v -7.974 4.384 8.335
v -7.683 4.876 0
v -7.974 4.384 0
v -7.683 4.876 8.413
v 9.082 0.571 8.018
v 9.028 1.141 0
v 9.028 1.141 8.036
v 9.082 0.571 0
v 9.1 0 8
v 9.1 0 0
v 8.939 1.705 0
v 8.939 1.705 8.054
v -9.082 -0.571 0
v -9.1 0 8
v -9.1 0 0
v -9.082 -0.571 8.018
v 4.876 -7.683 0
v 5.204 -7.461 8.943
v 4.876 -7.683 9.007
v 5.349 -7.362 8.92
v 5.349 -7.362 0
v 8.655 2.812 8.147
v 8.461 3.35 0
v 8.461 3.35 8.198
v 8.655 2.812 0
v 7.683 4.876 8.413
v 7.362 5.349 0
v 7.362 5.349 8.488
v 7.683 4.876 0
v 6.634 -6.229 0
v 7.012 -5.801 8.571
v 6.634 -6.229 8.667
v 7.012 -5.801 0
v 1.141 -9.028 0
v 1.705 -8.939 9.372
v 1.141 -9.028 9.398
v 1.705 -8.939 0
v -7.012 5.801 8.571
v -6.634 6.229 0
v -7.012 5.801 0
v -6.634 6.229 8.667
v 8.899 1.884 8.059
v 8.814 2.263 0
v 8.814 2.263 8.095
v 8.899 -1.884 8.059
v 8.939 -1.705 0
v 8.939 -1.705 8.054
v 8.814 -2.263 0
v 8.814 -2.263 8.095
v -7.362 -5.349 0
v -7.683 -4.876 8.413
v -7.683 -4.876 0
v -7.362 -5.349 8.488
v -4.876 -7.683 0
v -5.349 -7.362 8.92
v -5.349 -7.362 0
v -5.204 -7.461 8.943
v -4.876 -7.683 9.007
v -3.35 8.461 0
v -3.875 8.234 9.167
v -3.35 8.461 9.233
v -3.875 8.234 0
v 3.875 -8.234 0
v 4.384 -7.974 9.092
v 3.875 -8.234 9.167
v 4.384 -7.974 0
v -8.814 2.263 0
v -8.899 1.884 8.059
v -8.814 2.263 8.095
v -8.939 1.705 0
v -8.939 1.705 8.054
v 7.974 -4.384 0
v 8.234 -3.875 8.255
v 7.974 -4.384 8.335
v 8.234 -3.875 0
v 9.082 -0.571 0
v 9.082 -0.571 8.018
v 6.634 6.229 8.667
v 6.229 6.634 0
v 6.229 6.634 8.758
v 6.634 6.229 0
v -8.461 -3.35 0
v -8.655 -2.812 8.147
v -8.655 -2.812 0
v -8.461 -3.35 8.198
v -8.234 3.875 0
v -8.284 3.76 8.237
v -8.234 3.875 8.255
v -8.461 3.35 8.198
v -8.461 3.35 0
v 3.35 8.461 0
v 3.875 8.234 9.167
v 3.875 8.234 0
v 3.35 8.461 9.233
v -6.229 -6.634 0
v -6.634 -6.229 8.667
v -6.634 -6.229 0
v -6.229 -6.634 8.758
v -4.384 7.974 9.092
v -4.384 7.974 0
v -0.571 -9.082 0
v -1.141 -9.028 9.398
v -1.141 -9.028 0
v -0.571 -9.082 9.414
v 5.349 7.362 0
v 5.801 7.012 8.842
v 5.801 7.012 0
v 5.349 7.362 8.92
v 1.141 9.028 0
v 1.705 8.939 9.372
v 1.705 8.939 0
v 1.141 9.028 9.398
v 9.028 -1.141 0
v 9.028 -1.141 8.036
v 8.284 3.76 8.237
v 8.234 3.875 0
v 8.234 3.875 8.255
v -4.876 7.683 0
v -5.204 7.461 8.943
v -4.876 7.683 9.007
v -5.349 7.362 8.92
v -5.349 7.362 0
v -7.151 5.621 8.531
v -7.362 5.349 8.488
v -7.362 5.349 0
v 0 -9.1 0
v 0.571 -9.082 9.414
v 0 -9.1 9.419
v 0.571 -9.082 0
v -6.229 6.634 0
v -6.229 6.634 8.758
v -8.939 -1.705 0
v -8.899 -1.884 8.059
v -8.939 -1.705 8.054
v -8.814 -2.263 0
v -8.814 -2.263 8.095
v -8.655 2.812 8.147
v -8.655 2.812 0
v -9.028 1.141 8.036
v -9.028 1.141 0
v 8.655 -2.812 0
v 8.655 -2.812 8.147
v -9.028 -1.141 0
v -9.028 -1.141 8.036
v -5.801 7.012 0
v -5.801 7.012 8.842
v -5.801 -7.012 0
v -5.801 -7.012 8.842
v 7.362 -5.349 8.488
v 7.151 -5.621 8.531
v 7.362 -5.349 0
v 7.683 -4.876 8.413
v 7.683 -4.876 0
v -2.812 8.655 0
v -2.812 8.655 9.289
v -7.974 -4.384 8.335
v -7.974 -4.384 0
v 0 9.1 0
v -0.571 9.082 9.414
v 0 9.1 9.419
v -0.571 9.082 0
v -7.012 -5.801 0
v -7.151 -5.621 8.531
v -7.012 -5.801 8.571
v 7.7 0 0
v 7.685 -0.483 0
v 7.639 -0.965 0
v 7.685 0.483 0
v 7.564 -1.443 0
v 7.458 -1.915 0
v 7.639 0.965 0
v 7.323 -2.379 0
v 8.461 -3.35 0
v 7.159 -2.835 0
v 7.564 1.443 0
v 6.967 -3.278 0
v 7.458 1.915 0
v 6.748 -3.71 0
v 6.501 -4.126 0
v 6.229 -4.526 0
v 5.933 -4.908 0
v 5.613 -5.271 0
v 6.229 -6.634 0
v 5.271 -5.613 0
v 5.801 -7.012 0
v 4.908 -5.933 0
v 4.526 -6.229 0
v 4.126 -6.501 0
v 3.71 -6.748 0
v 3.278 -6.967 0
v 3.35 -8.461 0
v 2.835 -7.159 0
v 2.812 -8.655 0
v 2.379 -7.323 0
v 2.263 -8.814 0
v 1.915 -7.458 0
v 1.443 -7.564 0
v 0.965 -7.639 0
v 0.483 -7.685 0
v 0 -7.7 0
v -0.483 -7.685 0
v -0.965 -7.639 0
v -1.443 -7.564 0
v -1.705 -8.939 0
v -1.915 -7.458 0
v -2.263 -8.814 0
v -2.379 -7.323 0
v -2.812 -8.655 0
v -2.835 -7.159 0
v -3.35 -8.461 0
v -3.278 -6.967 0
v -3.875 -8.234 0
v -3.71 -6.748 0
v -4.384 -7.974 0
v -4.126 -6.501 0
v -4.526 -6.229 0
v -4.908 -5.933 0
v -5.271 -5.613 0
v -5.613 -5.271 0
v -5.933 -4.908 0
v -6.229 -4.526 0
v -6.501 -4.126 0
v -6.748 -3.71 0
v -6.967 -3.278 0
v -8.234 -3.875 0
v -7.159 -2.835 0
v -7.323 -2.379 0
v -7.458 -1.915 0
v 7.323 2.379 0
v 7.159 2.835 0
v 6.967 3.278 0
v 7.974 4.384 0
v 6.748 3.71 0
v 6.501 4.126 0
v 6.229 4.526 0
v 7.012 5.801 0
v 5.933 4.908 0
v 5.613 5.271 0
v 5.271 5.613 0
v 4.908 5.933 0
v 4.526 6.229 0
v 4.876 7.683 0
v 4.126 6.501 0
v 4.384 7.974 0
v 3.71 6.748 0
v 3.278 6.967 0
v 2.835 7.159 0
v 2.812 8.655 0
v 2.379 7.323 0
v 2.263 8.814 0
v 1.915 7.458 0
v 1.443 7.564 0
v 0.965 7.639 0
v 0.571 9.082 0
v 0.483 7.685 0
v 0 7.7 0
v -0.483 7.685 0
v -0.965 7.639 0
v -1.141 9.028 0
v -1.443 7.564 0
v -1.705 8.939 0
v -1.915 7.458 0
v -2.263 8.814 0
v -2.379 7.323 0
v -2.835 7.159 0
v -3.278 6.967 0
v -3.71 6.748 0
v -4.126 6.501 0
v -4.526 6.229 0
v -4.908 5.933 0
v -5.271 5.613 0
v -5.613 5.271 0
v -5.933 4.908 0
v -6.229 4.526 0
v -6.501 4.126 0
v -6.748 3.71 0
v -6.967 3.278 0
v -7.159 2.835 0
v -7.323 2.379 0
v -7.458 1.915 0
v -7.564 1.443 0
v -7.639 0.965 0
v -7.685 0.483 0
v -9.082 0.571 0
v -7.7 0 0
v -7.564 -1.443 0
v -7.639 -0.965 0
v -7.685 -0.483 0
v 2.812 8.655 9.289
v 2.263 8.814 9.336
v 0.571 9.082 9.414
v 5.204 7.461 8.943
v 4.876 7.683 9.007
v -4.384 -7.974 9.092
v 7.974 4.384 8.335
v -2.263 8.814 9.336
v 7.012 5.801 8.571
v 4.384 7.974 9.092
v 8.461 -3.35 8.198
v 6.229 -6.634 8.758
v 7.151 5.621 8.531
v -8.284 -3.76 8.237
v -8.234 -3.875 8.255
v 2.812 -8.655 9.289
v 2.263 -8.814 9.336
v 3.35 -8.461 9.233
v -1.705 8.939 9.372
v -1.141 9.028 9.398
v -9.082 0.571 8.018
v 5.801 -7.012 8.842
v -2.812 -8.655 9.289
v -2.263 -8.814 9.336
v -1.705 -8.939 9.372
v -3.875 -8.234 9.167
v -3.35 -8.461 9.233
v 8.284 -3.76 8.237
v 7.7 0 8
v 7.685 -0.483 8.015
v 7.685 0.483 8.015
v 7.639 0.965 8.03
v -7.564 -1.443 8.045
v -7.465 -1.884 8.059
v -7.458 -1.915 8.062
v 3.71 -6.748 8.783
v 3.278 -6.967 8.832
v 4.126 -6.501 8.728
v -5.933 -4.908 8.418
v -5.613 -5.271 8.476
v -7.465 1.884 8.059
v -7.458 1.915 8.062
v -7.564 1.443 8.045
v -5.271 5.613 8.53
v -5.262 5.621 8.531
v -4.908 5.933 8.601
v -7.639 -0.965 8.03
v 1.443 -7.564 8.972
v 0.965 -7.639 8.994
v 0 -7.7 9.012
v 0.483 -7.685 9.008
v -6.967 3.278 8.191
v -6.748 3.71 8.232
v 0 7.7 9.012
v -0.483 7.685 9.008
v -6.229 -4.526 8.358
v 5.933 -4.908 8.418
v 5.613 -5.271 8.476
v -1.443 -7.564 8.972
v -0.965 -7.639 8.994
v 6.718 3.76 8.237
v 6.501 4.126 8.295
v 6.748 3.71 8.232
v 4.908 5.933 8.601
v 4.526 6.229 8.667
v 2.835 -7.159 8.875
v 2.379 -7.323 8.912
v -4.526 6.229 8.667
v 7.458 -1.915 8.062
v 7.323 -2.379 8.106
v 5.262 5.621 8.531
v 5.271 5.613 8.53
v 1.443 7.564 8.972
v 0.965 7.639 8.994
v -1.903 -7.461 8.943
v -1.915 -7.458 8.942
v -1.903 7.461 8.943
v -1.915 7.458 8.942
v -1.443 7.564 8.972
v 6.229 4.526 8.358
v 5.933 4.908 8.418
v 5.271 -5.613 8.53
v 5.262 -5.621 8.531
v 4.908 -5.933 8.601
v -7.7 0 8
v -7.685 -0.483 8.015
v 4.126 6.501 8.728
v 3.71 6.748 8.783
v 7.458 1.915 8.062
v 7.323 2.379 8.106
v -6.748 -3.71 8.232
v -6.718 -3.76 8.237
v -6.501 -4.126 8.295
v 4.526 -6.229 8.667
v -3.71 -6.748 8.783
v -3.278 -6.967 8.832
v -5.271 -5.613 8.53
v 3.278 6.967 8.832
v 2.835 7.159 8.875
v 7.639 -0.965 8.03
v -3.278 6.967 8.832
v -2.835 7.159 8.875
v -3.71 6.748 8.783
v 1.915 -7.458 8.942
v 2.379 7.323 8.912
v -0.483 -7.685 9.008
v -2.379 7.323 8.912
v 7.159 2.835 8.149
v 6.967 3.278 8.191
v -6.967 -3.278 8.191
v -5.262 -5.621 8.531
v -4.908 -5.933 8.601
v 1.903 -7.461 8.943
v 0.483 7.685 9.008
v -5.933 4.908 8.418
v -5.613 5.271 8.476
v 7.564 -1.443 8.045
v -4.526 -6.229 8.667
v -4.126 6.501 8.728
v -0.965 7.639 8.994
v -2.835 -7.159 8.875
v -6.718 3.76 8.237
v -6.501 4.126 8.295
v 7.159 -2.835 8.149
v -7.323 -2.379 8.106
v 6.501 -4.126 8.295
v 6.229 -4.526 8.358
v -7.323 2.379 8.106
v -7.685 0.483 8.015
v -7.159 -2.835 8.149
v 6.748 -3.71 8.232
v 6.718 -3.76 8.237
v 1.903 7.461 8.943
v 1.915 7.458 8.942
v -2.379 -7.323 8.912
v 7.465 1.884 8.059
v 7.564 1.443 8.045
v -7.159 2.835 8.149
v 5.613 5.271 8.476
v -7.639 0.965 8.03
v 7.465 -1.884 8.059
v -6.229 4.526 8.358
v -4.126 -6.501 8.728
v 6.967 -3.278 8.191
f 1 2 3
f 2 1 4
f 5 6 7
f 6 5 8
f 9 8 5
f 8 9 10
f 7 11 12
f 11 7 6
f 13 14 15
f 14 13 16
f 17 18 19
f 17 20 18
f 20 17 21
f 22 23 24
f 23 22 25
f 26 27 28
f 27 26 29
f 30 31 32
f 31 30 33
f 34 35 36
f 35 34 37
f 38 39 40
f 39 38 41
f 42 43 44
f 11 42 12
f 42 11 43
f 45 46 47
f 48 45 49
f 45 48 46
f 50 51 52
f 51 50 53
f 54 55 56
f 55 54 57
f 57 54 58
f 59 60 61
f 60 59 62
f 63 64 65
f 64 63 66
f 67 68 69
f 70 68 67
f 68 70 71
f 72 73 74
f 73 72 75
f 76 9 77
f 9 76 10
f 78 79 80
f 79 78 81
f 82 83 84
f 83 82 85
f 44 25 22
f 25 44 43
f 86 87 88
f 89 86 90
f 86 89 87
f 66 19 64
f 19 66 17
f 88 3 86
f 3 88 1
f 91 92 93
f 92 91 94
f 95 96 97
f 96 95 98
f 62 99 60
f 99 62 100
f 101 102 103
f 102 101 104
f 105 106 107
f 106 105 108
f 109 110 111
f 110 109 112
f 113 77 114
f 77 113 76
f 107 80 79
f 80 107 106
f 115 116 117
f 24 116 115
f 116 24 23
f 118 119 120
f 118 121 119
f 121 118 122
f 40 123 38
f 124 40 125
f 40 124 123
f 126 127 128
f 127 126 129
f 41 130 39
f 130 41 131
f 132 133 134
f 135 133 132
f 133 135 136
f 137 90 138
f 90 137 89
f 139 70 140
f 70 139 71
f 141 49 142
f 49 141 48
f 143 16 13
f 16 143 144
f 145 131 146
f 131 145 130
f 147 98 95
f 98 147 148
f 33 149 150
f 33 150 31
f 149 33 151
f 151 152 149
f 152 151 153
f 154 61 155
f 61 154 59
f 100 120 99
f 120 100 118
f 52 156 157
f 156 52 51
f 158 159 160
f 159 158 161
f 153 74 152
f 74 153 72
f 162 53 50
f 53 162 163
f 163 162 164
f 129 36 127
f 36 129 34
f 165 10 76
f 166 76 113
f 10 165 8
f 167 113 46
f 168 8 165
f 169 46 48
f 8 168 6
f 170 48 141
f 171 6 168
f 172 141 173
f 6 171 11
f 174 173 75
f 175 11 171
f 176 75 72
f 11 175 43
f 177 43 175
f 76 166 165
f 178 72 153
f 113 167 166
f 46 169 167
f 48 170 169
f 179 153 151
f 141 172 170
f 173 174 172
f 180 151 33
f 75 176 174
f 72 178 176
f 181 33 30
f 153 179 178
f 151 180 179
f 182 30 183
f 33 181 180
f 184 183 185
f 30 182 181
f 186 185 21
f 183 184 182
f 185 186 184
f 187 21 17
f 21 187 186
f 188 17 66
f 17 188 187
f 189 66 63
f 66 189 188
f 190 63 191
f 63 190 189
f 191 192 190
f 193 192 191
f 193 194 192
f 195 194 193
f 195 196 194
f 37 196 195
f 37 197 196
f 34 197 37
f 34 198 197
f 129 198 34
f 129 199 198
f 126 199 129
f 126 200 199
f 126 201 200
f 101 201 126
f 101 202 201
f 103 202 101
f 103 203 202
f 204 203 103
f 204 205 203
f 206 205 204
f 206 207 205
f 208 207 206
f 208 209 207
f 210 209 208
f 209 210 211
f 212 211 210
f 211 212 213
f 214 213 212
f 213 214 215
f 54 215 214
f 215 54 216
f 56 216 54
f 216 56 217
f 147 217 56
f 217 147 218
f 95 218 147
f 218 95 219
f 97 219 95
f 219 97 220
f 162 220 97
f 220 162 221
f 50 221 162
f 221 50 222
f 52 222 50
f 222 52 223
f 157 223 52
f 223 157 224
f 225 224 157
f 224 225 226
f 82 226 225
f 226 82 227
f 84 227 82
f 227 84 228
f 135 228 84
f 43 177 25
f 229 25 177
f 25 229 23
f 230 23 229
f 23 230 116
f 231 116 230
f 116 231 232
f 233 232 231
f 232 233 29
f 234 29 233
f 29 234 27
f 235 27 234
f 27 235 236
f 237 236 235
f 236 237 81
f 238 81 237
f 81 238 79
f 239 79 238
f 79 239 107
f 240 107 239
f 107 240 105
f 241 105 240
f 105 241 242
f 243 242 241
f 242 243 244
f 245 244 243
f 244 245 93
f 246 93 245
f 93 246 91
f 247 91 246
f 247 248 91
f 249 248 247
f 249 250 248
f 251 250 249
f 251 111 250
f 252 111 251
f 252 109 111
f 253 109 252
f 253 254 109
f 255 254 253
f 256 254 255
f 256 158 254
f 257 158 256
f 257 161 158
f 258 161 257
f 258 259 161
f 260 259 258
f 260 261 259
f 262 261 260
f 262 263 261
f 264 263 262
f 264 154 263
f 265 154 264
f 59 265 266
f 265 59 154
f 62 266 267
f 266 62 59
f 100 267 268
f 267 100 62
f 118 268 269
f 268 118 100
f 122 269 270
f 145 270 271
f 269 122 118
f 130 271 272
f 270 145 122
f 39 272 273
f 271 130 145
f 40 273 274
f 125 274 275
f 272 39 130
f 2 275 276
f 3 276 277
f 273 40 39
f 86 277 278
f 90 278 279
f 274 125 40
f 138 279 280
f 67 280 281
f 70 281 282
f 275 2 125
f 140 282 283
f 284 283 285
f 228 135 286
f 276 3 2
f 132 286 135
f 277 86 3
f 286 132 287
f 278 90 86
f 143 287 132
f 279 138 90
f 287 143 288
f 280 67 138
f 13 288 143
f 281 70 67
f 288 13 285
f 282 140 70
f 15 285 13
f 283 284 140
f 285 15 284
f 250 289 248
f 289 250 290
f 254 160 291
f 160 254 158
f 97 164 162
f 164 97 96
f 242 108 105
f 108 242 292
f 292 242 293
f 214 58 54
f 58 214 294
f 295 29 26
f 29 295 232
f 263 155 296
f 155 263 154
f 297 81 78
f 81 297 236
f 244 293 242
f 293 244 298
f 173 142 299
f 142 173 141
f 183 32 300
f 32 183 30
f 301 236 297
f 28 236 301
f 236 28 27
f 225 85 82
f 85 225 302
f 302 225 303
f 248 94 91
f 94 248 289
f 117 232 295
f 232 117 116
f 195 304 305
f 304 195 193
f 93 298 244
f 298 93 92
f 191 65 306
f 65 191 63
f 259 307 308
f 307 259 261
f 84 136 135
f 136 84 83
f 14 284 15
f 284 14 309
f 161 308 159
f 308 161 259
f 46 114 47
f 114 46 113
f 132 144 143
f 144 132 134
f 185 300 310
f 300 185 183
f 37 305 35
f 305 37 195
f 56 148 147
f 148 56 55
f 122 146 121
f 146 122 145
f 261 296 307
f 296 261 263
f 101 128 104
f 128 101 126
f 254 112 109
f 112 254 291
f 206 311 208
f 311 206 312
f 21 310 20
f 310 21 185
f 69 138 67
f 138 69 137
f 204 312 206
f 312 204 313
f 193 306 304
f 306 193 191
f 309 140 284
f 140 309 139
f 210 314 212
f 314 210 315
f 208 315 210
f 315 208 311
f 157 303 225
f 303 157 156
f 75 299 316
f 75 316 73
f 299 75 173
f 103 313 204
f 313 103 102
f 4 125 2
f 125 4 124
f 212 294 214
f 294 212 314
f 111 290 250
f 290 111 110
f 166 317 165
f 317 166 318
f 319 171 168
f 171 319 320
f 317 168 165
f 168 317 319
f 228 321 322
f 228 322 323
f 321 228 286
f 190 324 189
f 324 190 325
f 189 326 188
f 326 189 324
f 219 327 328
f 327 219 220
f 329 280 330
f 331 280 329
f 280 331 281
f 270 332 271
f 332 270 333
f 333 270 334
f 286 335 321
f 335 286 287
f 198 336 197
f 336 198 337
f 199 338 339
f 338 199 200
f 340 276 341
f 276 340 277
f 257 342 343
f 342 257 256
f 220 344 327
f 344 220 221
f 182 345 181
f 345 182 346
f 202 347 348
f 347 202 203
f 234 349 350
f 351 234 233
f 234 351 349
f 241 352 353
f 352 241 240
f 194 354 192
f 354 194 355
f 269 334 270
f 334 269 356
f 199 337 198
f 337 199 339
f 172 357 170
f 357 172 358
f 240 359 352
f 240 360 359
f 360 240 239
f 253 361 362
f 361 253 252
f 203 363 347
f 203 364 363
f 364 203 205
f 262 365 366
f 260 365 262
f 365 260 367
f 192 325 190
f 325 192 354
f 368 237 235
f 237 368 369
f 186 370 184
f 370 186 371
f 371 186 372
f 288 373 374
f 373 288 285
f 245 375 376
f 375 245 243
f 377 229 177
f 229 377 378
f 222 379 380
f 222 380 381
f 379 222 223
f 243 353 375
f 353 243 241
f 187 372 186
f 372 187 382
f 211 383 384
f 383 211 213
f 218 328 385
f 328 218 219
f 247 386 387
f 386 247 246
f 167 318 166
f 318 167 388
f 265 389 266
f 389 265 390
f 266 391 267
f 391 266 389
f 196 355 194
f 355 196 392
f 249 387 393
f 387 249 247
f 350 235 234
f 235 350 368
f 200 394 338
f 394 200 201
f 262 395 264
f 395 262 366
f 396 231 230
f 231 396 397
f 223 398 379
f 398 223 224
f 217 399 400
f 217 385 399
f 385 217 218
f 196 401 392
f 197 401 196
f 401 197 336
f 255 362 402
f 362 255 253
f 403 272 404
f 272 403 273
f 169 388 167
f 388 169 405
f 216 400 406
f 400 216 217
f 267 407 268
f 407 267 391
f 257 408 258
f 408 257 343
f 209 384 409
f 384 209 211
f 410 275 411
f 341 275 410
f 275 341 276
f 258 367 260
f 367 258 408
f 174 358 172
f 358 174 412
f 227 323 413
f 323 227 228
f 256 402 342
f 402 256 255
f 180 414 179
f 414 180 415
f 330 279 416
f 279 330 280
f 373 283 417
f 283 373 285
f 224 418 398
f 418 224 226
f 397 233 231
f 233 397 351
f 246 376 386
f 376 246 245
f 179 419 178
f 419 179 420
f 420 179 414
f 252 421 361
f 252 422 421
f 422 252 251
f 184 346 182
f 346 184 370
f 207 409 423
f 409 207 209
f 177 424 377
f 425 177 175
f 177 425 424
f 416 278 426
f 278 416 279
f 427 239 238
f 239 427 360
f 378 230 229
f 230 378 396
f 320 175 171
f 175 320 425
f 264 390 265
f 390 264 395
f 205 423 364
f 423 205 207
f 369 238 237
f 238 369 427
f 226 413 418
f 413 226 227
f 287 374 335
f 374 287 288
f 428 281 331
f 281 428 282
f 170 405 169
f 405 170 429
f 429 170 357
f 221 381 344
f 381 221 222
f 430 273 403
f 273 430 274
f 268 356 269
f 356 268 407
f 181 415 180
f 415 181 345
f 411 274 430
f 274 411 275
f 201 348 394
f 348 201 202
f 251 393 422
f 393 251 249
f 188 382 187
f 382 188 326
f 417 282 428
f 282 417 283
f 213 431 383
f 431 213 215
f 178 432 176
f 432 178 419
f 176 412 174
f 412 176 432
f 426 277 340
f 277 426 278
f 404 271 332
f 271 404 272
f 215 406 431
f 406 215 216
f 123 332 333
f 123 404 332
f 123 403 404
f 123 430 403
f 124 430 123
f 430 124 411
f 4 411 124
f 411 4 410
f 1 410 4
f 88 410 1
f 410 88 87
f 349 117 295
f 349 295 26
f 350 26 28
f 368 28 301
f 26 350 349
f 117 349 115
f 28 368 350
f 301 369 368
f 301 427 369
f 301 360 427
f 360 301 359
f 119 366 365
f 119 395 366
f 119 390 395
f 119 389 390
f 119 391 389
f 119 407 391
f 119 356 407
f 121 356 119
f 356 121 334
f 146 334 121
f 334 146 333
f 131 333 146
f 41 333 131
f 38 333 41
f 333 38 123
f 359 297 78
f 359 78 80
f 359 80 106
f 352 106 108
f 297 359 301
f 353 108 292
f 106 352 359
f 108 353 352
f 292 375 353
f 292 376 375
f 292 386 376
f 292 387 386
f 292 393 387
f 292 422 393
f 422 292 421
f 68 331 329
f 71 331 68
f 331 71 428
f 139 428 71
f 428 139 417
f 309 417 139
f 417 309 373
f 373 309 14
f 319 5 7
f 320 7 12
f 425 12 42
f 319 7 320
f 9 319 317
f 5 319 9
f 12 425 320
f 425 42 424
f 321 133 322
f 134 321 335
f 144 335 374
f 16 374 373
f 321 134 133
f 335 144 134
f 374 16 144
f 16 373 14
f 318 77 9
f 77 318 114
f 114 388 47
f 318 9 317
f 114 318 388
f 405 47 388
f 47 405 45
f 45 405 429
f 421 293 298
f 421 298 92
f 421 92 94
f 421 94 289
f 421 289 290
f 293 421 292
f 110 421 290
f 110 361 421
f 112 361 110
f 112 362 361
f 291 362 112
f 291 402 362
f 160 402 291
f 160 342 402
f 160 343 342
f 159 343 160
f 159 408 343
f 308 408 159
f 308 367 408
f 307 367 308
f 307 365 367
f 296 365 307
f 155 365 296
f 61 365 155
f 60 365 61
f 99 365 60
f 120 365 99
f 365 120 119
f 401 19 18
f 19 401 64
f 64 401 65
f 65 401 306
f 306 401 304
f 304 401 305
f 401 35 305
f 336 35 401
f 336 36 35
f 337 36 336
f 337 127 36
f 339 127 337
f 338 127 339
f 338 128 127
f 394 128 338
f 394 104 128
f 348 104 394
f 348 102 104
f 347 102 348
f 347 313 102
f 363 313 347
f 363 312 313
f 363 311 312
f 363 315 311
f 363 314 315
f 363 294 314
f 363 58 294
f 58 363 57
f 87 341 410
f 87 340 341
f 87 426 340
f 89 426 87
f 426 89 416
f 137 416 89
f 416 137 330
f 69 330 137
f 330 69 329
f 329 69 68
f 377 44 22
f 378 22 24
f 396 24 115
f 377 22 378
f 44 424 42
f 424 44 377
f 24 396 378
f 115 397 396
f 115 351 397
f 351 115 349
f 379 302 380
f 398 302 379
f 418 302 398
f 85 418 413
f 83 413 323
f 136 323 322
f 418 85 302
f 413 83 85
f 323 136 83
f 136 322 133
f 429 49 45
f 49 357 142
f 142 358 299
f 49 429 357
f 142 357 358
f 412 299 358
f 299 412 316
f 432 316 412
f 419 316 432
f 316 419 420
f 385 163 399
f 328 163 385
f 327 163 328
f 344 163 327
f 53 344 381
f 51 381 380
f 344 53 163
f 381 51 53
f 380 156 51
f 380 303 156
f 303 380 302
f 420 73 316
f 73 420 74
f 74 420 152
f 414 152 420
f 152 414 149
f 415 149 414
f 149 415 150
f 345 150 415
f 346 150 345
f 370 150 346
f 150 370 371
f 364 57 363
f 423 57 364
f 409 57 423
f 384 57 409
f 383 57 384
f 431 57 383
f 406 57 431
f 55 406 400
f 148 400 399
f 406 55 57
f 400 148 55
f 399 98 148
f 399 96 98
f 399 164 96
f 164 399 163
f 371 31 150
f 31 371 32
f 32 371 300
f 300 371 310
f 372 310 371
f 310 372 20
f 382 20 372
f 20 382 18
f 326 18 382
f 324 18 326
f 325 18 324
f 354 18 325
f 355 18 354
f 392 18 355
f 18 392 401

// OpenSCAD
/*Round Duct/Pipework fittings Library - Parametric
V1.1
By the DoomMeister

//Released under the terms of the GNU GPL v3.0
This program is free software: you can redistribute it and/or modify
it under the terms of the GNU General Public License as published by
the Free Software Foundation, either version 3 of the License, or
(at your option) any later version.

This program is distributed in the hope that it will be useful,
but WITHOUT ANY WARRANTY; without even the implied warranty of
MERCHANTABILITY or FITNESS FOR A PARTICULAR PURPOSE. See the
GNU General Public License for more details.

You should have received a copy of the GNU General Public License
along with this program. If not, see <http://www.gnu.org/licenses/>.

**
WARNING - No warrenty is given regarding the fitness of these parts to convey pressurised 
media if they are fabricated by any means. The user takes all risk in terms of saftey and material choice. 
**

V1 - First Issue, messy code
V1.1 - Added simple support for internal step and printable switch

Shapes

Straight
Elbow/Tee (any angle, n ways)
Nozel
Reducer
Manifold

Solvent
Clamp
O-Ring Push Fit - not implemented yet

*/

duct_OD = 15;//15,22,28,35,42,54,65,80,100,150
duct_OD2 = 15;
duct_wall = .7;
duct_length = 40;
quality = 100;
clearance = 0.2;
o_ring_section = 3;
layer_height = 0.3;
bolt_OD = round(duct_OD/8);
reduction_angle = 90;
end_type = "solvent"; //solvent, clamp, none
printable = true; // make output more suitable for 3d FDM printing


duct_OR = duct_OD/2;
duct_OR2 = duct_OD2/2;
duct_IR = (duct_OD-(2*duct_wall))/2;
duct_IR2 = (duct_OD2-(2*duct_wall))/2;
reduction_length = (duct_OR - duct_OR2)/sin(reduction_angle);
clamp_IR = duct_OR + clearance;
clamp_OR = clamp_IR + (2*duct_wall);
clamp_reduction_length = (clamp_OR - duct_OR)/sin(reduction_angle);

length = 25;
led_spacing = [1000/30, 1000/60, 1000/144];
offset1 =(3*bolt_OD) + clamp_reduction_length;


difference() {

//rotate([180,0,0])
      end(end_form="solvent");
  /*
  union() {
    middle_straight(length);
    translate([0,0,-offset1])
      end(end_form="solvent");
    translate([0,0,length+offset1])rotate([180,0,0])
      end(end_form="solvent");
  }
  *//*
  translate([0,0,-20])
  cylinder(r = duct_IR, h = length);
    */
  translate([0,0,60/2+8])
  rotate([0,90,0])
  cylinder(d=60, h =20, center=true, $fn=100);

  
  /*
  for(j=[0:0]){
    // TOp LED
    translate([-duct_OR,0,length/2+j*led_spacing[1]])
      cube([5, 5.6,5.6], center=true);

      // Hole for wiring
      translate([+duct_OR,0,length/2+j*led_spacing[1]]) rotate([0,90,0])
        cylinder(h=5, d=5, center=true, $fn=32);
      }
    */
  
}

//draw
/*
translate([0,0,0])middle_straight();
translate([1*1.5*duct_OD,0*1.5*duct_OD,0])pipe();
connector(end=end_type);
translate([2*1.5*duct_OD,0*1.5*duct_OD,0])elbow(end=end_type);
translate([2*1.5*duct_OD,2*1.5*duct_OD,0])equal_tee(end=end_type);
translate([2*1.5*duct_OD,3*1.5*duct_OD,0])4_way_tee(end=end_type);
translate([0*1.5*duct_OD,3*1.5*duct_OD,0])middle_reducer(end=end_type);

*/
/*
translate([0*1.5*duct_OD,1.5*1.5*duct_OD,0])
led_tee_n(ways = 2, end=end_type, angle=180);
*/
  

/*
translate([0*1.5*duct_OD,4*1.5*duct_OD,0])blank_cap(end=end_type);
middle_tee_n(ways = 3, end=end_type, angle = 120 ,center = true, $fn=quality);
middle_tee_n(ways = 2, end=end_type, angle = 135 ,center = true, $fn=quality);


translate([0*1.5*duct_OD,5*1.5*duct_OD,0])manifold_n(ways = 6, end=end_type,center = true, $fn=quality);
*/

module led_tee_n(ways = 1, end="solvent", angle = 130 ,center = true, $fn=quality)
{
  
  
  
  led_spacing = [1000/30, 1000/60, 1000/144]; // Common values of LEDs/metre ar 30/60/144
  
  lengths = [54,duct_OD*1.5,54];
	difference()
	{
		union()
		{
			sphere(r=duct_OD/2);
			for( i = [0:ways-1])
			{
				rotate([0,i*angle,0])straight(end=end,length=lengths[i]);//cylinder(r = duct_OR, h = duct_length);
      }
		}
    
		union()
		{
			sphere(r=duct_IR);
			for( i = [0:ways-1])
			{
				rotate([0,i*angle,0])cylinder(r = duct_IR, h = lengths[i]+1);
			}
      
      for(j=[0:4]){
      translate([-duct_OR,0,-33.3+j*led_spacing[1]])
        cube([5, 5.6,5.6], center=true);
      }
		}
    
	}

}










//alaises
module elbow(end="solvent", angle = 90,center = true, $fn=quality)
{
	middle_tee_n(end=end,ways=2, angle = angle); 	
}

module equal_tee(end="solvent",angle = 90,center = true, $fn=quality)
{
	middle_tee_n(end=end,ways=3, angle = 90); 	
}

module 4_way_tee(end="solvent",angle = 90,center = true, $fn=quality)
{
	middle_tee_n(end=end,ways=4, angle = 90); 	
}


//modules

module pipe(length=duct_length)
{
	middle_straight(length=length);
}


module straight(end = "solvent",length=duct_length)
{

offset1 =(3*bolt_OD) + clamp_reduction_length;

	union()
	{



	middle_straight(length=length-(offset1));
	translate([0,0,length])rotate([180,0,0])end(end_form=end);
	}
}

module blank_cap(end = "solvent",length=duct_length,$fn=quality)
{

offset1 =(3*bolt_OD) + clamp_reduction_length;

	union()
	{


	translate([0,0,-duct_wall])cylinder(r=duct_OR, h = duct_wall);
	middle_straight(length=length-(offset1));
	translate([0,0,length])rotate([180,0,0])end(end_form=end);
	}
}


module end(end_form = "solvent")
{
if(end_form == "clamp")
{
	end_clamp();
}
if(end_form == "solvent")
{
	end_solvent();
}
}

module connector(end="solvent", length=2*duct_OD)
{
offset_length = 3*bolt_OD+clamp_reduction_length;

union()
{
	middle_straight(length=length-(2*offset_length));
	translate([0,0,length-offset_length])rotate([180,0,0])end(end_form=end);
	translate([0,0,-offset_length])rotate([0,0,0])end(end_form=end);
}
}




//middle_modules

module middle_straight(length = 40, center = true, $fn=quality)
{
	difference()
	{
		cylinder(r = duct_OR, h = length);
		translate([0,0,-1])cylinder(r = duct_IR, h = length+2);
	}
}




module middle_tee_n(ways = 1, end="solvent", angle = 130 ,center = true, $fn=quality)
{
	difference()
	{
		union()
		{
			sphere(r=duct_OD/2);
			for( i = [0:ways-1])
			{
				rotate([0,i*angle,0])straight(end=end,length=duct_OD*1.5);//cylinder(r = duct_OR, h = duct_length);
			}
		}
		union()
		{
			sphere(r=duct_IR);
			for( i = [0:ways-1])
			{
				rotate([0,i*angle,0])cylinder(r = duct_IR, h = duct_length+1);
			}
		}
	}

}

module manifold_n(ways = 3, end="solvent", offset=1.5,center = true, $fn=quality)
{
	
	difference()
	{
		union()
		{
			//sphere(r=duct_OD/2);
			rotate([0,270,0])straight(end=end,length=duct_OD*1.5);
			rotate([0,90,0])cylinder(r=duct_OR, h = ways*duct_OD*offset);
			for( i = [0:ways-1])
			{
				translate([i*duct_OD*offset,0,0,])rotate([0,180,90])straight(end=end,length=duct_OD*1.5);
			}
		}
		union()
		{
			#sphere(r=duct_IR);
			translate([-1,0,0,])rotate([0,90,0])cylinder(r=duct_IR, h = ways*duct_OD*offset+2);
			for( i = [0:ways-1])
			{
				translate([i*duct_OD*offset,0,0,])rotate([0,180,90])cylinder(r = duct_IR, h = duct_length+1);
			}
		}
	}

}

module middle_reducer(end="solvent",center = true, $fn=quality)
{
	length1 = (duct_length - reduction_length)/2;
	offset_length = 3*bolt_OD+clamp_reduction_length;
	union()
	{
		difference()
		{
			cylinder(r = duct_OR, h = length1);
			translate([0,0,-1])cylinder(r = duct_IR, h = length1+1);
		}
		translate([0,0,length1])
		difference()
		{
			cylinder(r1 = duct_OR,r2 = duct_OR2, h = reduction_length);
			translate([0,0,0])cylinder(r1 = duct_IR,r2 = duct_IR2, h = reduction_length);
		}
		translate([0,0,length1+reduction_length])
		difference()
		{
			cylinder(r = duct_OR2, h = length1);
			translate([0,0,-1])cylinder(r = duct_IR2, h = length1+2);
		}
	
		translate([0,0,-offset_length])rotate([0,0,0])end(end_form=end);

	}


}


module middle_nozel()
{

}

module end_clamp(center = true, $fn=quality)
{
	union()
	{
	difference()
	{
		union()
		{
			cylinder(r = clamp_OR, h = bolt_OD*3);
			translate([clamp_OR-bolt_OD*3,-bolt_OD*2.5,0])cube([bolt_OD*4,bolt_OD*5,bolt_OD*3]);
			translate([clamp_OR+bolt_OD,bolt_OD*1.5,0])rotate([0,0,0])cylinder(r=bolt_OD, h = bolt_OD*3);
			translate([clamp_OR+bolt_OD,-bolt_OD*1.5,0])rotate([0,0,0])cylinder(r=bolt_OD, h = bolt_OD*3);
		}
		#translate([0,0,-1])cylinder(r = clamp_IR, h = (bolt_OD*3)+2);
		translate([clamp_OR-bolt_OD*2,-bolt_OD*0.5,0])cube([bolt_OD*5,bolt_OD,bolt_OD*3]);
		translate([clamp_OR+(bolt_OD*0.75),bolt_OD*3,bolt_OD*1.5])rotate([90,0,0])cylinder(r=bolt_OD/2, h = bolt_OD*6);
		translate([clamp_IR-bolt_OD,0,bolt_OD*3])rotate([0,90,0])cylinder(r=bolt_OD, h = bolt_OD*6);
		translate([clamp_OR-bolt_OD,0,0])rotate([0,0,0])cylinder(r=bolt_OD, h = bolt_OD*3);

	}
		translate([0,0,bolt_OD*3])
		#difference()
		{
			cylinder(r1 = clamp_OR,r2 = duct_OR, h = clamp_reduction_length);
			cylinder(r = clamp_IR, h = clamp_reduction_length*0.4);
			translate([0,0,0])cylinder(r1 = clamp_IR,r2 = duct_IR, h = clamp_reduction_length);
			//#translate([clamp_IR-bolt_OD,0,0])rotate([0,90,0])cylinder(r=bolt_OD, h = bolt_OD*6);
		}
		if(printable)
		{
		//Support skin for step
		translate([0,0,bolt_OD*3+clamp_reduction_length*0.4])
		cylinder(r= clamp_IR+0.5, h = layer_height *2);
		}
	}

}

module end_solvent(center = true, $fn=quality)
{
	union()
	{
	difference()
	{
		union()
		{
			cylinder(r = clamp_OR, h = duct_OD*0.66);
		}
		translate([0,0,-1])cylinder(r = clamp_IR, h = (duct_OD*0.66)+2);
	}
		translate([0,0,duct_OD*0.66])
		difference()
		{
			cylinder(r1 = clamp_OR,r2 = duct_OR, h = clamp_reduction_length);
			cylinder(r = clamp_IR, h = clamp_reduction_length*0.4);
			translate([0,0,0])cylinder(r1 = clamp_IR,r2 = duct_IR, h = clamp_reduction_length);
		}

		if(printable)
		{
		//Support skin for step
		translate([0,0,(duct_OD*0.66)])
		cylinder(r= clamp_IR+0.5, h = layer_height *2);
		}
	}

}

echo(reduction_length,bolt_OD);
